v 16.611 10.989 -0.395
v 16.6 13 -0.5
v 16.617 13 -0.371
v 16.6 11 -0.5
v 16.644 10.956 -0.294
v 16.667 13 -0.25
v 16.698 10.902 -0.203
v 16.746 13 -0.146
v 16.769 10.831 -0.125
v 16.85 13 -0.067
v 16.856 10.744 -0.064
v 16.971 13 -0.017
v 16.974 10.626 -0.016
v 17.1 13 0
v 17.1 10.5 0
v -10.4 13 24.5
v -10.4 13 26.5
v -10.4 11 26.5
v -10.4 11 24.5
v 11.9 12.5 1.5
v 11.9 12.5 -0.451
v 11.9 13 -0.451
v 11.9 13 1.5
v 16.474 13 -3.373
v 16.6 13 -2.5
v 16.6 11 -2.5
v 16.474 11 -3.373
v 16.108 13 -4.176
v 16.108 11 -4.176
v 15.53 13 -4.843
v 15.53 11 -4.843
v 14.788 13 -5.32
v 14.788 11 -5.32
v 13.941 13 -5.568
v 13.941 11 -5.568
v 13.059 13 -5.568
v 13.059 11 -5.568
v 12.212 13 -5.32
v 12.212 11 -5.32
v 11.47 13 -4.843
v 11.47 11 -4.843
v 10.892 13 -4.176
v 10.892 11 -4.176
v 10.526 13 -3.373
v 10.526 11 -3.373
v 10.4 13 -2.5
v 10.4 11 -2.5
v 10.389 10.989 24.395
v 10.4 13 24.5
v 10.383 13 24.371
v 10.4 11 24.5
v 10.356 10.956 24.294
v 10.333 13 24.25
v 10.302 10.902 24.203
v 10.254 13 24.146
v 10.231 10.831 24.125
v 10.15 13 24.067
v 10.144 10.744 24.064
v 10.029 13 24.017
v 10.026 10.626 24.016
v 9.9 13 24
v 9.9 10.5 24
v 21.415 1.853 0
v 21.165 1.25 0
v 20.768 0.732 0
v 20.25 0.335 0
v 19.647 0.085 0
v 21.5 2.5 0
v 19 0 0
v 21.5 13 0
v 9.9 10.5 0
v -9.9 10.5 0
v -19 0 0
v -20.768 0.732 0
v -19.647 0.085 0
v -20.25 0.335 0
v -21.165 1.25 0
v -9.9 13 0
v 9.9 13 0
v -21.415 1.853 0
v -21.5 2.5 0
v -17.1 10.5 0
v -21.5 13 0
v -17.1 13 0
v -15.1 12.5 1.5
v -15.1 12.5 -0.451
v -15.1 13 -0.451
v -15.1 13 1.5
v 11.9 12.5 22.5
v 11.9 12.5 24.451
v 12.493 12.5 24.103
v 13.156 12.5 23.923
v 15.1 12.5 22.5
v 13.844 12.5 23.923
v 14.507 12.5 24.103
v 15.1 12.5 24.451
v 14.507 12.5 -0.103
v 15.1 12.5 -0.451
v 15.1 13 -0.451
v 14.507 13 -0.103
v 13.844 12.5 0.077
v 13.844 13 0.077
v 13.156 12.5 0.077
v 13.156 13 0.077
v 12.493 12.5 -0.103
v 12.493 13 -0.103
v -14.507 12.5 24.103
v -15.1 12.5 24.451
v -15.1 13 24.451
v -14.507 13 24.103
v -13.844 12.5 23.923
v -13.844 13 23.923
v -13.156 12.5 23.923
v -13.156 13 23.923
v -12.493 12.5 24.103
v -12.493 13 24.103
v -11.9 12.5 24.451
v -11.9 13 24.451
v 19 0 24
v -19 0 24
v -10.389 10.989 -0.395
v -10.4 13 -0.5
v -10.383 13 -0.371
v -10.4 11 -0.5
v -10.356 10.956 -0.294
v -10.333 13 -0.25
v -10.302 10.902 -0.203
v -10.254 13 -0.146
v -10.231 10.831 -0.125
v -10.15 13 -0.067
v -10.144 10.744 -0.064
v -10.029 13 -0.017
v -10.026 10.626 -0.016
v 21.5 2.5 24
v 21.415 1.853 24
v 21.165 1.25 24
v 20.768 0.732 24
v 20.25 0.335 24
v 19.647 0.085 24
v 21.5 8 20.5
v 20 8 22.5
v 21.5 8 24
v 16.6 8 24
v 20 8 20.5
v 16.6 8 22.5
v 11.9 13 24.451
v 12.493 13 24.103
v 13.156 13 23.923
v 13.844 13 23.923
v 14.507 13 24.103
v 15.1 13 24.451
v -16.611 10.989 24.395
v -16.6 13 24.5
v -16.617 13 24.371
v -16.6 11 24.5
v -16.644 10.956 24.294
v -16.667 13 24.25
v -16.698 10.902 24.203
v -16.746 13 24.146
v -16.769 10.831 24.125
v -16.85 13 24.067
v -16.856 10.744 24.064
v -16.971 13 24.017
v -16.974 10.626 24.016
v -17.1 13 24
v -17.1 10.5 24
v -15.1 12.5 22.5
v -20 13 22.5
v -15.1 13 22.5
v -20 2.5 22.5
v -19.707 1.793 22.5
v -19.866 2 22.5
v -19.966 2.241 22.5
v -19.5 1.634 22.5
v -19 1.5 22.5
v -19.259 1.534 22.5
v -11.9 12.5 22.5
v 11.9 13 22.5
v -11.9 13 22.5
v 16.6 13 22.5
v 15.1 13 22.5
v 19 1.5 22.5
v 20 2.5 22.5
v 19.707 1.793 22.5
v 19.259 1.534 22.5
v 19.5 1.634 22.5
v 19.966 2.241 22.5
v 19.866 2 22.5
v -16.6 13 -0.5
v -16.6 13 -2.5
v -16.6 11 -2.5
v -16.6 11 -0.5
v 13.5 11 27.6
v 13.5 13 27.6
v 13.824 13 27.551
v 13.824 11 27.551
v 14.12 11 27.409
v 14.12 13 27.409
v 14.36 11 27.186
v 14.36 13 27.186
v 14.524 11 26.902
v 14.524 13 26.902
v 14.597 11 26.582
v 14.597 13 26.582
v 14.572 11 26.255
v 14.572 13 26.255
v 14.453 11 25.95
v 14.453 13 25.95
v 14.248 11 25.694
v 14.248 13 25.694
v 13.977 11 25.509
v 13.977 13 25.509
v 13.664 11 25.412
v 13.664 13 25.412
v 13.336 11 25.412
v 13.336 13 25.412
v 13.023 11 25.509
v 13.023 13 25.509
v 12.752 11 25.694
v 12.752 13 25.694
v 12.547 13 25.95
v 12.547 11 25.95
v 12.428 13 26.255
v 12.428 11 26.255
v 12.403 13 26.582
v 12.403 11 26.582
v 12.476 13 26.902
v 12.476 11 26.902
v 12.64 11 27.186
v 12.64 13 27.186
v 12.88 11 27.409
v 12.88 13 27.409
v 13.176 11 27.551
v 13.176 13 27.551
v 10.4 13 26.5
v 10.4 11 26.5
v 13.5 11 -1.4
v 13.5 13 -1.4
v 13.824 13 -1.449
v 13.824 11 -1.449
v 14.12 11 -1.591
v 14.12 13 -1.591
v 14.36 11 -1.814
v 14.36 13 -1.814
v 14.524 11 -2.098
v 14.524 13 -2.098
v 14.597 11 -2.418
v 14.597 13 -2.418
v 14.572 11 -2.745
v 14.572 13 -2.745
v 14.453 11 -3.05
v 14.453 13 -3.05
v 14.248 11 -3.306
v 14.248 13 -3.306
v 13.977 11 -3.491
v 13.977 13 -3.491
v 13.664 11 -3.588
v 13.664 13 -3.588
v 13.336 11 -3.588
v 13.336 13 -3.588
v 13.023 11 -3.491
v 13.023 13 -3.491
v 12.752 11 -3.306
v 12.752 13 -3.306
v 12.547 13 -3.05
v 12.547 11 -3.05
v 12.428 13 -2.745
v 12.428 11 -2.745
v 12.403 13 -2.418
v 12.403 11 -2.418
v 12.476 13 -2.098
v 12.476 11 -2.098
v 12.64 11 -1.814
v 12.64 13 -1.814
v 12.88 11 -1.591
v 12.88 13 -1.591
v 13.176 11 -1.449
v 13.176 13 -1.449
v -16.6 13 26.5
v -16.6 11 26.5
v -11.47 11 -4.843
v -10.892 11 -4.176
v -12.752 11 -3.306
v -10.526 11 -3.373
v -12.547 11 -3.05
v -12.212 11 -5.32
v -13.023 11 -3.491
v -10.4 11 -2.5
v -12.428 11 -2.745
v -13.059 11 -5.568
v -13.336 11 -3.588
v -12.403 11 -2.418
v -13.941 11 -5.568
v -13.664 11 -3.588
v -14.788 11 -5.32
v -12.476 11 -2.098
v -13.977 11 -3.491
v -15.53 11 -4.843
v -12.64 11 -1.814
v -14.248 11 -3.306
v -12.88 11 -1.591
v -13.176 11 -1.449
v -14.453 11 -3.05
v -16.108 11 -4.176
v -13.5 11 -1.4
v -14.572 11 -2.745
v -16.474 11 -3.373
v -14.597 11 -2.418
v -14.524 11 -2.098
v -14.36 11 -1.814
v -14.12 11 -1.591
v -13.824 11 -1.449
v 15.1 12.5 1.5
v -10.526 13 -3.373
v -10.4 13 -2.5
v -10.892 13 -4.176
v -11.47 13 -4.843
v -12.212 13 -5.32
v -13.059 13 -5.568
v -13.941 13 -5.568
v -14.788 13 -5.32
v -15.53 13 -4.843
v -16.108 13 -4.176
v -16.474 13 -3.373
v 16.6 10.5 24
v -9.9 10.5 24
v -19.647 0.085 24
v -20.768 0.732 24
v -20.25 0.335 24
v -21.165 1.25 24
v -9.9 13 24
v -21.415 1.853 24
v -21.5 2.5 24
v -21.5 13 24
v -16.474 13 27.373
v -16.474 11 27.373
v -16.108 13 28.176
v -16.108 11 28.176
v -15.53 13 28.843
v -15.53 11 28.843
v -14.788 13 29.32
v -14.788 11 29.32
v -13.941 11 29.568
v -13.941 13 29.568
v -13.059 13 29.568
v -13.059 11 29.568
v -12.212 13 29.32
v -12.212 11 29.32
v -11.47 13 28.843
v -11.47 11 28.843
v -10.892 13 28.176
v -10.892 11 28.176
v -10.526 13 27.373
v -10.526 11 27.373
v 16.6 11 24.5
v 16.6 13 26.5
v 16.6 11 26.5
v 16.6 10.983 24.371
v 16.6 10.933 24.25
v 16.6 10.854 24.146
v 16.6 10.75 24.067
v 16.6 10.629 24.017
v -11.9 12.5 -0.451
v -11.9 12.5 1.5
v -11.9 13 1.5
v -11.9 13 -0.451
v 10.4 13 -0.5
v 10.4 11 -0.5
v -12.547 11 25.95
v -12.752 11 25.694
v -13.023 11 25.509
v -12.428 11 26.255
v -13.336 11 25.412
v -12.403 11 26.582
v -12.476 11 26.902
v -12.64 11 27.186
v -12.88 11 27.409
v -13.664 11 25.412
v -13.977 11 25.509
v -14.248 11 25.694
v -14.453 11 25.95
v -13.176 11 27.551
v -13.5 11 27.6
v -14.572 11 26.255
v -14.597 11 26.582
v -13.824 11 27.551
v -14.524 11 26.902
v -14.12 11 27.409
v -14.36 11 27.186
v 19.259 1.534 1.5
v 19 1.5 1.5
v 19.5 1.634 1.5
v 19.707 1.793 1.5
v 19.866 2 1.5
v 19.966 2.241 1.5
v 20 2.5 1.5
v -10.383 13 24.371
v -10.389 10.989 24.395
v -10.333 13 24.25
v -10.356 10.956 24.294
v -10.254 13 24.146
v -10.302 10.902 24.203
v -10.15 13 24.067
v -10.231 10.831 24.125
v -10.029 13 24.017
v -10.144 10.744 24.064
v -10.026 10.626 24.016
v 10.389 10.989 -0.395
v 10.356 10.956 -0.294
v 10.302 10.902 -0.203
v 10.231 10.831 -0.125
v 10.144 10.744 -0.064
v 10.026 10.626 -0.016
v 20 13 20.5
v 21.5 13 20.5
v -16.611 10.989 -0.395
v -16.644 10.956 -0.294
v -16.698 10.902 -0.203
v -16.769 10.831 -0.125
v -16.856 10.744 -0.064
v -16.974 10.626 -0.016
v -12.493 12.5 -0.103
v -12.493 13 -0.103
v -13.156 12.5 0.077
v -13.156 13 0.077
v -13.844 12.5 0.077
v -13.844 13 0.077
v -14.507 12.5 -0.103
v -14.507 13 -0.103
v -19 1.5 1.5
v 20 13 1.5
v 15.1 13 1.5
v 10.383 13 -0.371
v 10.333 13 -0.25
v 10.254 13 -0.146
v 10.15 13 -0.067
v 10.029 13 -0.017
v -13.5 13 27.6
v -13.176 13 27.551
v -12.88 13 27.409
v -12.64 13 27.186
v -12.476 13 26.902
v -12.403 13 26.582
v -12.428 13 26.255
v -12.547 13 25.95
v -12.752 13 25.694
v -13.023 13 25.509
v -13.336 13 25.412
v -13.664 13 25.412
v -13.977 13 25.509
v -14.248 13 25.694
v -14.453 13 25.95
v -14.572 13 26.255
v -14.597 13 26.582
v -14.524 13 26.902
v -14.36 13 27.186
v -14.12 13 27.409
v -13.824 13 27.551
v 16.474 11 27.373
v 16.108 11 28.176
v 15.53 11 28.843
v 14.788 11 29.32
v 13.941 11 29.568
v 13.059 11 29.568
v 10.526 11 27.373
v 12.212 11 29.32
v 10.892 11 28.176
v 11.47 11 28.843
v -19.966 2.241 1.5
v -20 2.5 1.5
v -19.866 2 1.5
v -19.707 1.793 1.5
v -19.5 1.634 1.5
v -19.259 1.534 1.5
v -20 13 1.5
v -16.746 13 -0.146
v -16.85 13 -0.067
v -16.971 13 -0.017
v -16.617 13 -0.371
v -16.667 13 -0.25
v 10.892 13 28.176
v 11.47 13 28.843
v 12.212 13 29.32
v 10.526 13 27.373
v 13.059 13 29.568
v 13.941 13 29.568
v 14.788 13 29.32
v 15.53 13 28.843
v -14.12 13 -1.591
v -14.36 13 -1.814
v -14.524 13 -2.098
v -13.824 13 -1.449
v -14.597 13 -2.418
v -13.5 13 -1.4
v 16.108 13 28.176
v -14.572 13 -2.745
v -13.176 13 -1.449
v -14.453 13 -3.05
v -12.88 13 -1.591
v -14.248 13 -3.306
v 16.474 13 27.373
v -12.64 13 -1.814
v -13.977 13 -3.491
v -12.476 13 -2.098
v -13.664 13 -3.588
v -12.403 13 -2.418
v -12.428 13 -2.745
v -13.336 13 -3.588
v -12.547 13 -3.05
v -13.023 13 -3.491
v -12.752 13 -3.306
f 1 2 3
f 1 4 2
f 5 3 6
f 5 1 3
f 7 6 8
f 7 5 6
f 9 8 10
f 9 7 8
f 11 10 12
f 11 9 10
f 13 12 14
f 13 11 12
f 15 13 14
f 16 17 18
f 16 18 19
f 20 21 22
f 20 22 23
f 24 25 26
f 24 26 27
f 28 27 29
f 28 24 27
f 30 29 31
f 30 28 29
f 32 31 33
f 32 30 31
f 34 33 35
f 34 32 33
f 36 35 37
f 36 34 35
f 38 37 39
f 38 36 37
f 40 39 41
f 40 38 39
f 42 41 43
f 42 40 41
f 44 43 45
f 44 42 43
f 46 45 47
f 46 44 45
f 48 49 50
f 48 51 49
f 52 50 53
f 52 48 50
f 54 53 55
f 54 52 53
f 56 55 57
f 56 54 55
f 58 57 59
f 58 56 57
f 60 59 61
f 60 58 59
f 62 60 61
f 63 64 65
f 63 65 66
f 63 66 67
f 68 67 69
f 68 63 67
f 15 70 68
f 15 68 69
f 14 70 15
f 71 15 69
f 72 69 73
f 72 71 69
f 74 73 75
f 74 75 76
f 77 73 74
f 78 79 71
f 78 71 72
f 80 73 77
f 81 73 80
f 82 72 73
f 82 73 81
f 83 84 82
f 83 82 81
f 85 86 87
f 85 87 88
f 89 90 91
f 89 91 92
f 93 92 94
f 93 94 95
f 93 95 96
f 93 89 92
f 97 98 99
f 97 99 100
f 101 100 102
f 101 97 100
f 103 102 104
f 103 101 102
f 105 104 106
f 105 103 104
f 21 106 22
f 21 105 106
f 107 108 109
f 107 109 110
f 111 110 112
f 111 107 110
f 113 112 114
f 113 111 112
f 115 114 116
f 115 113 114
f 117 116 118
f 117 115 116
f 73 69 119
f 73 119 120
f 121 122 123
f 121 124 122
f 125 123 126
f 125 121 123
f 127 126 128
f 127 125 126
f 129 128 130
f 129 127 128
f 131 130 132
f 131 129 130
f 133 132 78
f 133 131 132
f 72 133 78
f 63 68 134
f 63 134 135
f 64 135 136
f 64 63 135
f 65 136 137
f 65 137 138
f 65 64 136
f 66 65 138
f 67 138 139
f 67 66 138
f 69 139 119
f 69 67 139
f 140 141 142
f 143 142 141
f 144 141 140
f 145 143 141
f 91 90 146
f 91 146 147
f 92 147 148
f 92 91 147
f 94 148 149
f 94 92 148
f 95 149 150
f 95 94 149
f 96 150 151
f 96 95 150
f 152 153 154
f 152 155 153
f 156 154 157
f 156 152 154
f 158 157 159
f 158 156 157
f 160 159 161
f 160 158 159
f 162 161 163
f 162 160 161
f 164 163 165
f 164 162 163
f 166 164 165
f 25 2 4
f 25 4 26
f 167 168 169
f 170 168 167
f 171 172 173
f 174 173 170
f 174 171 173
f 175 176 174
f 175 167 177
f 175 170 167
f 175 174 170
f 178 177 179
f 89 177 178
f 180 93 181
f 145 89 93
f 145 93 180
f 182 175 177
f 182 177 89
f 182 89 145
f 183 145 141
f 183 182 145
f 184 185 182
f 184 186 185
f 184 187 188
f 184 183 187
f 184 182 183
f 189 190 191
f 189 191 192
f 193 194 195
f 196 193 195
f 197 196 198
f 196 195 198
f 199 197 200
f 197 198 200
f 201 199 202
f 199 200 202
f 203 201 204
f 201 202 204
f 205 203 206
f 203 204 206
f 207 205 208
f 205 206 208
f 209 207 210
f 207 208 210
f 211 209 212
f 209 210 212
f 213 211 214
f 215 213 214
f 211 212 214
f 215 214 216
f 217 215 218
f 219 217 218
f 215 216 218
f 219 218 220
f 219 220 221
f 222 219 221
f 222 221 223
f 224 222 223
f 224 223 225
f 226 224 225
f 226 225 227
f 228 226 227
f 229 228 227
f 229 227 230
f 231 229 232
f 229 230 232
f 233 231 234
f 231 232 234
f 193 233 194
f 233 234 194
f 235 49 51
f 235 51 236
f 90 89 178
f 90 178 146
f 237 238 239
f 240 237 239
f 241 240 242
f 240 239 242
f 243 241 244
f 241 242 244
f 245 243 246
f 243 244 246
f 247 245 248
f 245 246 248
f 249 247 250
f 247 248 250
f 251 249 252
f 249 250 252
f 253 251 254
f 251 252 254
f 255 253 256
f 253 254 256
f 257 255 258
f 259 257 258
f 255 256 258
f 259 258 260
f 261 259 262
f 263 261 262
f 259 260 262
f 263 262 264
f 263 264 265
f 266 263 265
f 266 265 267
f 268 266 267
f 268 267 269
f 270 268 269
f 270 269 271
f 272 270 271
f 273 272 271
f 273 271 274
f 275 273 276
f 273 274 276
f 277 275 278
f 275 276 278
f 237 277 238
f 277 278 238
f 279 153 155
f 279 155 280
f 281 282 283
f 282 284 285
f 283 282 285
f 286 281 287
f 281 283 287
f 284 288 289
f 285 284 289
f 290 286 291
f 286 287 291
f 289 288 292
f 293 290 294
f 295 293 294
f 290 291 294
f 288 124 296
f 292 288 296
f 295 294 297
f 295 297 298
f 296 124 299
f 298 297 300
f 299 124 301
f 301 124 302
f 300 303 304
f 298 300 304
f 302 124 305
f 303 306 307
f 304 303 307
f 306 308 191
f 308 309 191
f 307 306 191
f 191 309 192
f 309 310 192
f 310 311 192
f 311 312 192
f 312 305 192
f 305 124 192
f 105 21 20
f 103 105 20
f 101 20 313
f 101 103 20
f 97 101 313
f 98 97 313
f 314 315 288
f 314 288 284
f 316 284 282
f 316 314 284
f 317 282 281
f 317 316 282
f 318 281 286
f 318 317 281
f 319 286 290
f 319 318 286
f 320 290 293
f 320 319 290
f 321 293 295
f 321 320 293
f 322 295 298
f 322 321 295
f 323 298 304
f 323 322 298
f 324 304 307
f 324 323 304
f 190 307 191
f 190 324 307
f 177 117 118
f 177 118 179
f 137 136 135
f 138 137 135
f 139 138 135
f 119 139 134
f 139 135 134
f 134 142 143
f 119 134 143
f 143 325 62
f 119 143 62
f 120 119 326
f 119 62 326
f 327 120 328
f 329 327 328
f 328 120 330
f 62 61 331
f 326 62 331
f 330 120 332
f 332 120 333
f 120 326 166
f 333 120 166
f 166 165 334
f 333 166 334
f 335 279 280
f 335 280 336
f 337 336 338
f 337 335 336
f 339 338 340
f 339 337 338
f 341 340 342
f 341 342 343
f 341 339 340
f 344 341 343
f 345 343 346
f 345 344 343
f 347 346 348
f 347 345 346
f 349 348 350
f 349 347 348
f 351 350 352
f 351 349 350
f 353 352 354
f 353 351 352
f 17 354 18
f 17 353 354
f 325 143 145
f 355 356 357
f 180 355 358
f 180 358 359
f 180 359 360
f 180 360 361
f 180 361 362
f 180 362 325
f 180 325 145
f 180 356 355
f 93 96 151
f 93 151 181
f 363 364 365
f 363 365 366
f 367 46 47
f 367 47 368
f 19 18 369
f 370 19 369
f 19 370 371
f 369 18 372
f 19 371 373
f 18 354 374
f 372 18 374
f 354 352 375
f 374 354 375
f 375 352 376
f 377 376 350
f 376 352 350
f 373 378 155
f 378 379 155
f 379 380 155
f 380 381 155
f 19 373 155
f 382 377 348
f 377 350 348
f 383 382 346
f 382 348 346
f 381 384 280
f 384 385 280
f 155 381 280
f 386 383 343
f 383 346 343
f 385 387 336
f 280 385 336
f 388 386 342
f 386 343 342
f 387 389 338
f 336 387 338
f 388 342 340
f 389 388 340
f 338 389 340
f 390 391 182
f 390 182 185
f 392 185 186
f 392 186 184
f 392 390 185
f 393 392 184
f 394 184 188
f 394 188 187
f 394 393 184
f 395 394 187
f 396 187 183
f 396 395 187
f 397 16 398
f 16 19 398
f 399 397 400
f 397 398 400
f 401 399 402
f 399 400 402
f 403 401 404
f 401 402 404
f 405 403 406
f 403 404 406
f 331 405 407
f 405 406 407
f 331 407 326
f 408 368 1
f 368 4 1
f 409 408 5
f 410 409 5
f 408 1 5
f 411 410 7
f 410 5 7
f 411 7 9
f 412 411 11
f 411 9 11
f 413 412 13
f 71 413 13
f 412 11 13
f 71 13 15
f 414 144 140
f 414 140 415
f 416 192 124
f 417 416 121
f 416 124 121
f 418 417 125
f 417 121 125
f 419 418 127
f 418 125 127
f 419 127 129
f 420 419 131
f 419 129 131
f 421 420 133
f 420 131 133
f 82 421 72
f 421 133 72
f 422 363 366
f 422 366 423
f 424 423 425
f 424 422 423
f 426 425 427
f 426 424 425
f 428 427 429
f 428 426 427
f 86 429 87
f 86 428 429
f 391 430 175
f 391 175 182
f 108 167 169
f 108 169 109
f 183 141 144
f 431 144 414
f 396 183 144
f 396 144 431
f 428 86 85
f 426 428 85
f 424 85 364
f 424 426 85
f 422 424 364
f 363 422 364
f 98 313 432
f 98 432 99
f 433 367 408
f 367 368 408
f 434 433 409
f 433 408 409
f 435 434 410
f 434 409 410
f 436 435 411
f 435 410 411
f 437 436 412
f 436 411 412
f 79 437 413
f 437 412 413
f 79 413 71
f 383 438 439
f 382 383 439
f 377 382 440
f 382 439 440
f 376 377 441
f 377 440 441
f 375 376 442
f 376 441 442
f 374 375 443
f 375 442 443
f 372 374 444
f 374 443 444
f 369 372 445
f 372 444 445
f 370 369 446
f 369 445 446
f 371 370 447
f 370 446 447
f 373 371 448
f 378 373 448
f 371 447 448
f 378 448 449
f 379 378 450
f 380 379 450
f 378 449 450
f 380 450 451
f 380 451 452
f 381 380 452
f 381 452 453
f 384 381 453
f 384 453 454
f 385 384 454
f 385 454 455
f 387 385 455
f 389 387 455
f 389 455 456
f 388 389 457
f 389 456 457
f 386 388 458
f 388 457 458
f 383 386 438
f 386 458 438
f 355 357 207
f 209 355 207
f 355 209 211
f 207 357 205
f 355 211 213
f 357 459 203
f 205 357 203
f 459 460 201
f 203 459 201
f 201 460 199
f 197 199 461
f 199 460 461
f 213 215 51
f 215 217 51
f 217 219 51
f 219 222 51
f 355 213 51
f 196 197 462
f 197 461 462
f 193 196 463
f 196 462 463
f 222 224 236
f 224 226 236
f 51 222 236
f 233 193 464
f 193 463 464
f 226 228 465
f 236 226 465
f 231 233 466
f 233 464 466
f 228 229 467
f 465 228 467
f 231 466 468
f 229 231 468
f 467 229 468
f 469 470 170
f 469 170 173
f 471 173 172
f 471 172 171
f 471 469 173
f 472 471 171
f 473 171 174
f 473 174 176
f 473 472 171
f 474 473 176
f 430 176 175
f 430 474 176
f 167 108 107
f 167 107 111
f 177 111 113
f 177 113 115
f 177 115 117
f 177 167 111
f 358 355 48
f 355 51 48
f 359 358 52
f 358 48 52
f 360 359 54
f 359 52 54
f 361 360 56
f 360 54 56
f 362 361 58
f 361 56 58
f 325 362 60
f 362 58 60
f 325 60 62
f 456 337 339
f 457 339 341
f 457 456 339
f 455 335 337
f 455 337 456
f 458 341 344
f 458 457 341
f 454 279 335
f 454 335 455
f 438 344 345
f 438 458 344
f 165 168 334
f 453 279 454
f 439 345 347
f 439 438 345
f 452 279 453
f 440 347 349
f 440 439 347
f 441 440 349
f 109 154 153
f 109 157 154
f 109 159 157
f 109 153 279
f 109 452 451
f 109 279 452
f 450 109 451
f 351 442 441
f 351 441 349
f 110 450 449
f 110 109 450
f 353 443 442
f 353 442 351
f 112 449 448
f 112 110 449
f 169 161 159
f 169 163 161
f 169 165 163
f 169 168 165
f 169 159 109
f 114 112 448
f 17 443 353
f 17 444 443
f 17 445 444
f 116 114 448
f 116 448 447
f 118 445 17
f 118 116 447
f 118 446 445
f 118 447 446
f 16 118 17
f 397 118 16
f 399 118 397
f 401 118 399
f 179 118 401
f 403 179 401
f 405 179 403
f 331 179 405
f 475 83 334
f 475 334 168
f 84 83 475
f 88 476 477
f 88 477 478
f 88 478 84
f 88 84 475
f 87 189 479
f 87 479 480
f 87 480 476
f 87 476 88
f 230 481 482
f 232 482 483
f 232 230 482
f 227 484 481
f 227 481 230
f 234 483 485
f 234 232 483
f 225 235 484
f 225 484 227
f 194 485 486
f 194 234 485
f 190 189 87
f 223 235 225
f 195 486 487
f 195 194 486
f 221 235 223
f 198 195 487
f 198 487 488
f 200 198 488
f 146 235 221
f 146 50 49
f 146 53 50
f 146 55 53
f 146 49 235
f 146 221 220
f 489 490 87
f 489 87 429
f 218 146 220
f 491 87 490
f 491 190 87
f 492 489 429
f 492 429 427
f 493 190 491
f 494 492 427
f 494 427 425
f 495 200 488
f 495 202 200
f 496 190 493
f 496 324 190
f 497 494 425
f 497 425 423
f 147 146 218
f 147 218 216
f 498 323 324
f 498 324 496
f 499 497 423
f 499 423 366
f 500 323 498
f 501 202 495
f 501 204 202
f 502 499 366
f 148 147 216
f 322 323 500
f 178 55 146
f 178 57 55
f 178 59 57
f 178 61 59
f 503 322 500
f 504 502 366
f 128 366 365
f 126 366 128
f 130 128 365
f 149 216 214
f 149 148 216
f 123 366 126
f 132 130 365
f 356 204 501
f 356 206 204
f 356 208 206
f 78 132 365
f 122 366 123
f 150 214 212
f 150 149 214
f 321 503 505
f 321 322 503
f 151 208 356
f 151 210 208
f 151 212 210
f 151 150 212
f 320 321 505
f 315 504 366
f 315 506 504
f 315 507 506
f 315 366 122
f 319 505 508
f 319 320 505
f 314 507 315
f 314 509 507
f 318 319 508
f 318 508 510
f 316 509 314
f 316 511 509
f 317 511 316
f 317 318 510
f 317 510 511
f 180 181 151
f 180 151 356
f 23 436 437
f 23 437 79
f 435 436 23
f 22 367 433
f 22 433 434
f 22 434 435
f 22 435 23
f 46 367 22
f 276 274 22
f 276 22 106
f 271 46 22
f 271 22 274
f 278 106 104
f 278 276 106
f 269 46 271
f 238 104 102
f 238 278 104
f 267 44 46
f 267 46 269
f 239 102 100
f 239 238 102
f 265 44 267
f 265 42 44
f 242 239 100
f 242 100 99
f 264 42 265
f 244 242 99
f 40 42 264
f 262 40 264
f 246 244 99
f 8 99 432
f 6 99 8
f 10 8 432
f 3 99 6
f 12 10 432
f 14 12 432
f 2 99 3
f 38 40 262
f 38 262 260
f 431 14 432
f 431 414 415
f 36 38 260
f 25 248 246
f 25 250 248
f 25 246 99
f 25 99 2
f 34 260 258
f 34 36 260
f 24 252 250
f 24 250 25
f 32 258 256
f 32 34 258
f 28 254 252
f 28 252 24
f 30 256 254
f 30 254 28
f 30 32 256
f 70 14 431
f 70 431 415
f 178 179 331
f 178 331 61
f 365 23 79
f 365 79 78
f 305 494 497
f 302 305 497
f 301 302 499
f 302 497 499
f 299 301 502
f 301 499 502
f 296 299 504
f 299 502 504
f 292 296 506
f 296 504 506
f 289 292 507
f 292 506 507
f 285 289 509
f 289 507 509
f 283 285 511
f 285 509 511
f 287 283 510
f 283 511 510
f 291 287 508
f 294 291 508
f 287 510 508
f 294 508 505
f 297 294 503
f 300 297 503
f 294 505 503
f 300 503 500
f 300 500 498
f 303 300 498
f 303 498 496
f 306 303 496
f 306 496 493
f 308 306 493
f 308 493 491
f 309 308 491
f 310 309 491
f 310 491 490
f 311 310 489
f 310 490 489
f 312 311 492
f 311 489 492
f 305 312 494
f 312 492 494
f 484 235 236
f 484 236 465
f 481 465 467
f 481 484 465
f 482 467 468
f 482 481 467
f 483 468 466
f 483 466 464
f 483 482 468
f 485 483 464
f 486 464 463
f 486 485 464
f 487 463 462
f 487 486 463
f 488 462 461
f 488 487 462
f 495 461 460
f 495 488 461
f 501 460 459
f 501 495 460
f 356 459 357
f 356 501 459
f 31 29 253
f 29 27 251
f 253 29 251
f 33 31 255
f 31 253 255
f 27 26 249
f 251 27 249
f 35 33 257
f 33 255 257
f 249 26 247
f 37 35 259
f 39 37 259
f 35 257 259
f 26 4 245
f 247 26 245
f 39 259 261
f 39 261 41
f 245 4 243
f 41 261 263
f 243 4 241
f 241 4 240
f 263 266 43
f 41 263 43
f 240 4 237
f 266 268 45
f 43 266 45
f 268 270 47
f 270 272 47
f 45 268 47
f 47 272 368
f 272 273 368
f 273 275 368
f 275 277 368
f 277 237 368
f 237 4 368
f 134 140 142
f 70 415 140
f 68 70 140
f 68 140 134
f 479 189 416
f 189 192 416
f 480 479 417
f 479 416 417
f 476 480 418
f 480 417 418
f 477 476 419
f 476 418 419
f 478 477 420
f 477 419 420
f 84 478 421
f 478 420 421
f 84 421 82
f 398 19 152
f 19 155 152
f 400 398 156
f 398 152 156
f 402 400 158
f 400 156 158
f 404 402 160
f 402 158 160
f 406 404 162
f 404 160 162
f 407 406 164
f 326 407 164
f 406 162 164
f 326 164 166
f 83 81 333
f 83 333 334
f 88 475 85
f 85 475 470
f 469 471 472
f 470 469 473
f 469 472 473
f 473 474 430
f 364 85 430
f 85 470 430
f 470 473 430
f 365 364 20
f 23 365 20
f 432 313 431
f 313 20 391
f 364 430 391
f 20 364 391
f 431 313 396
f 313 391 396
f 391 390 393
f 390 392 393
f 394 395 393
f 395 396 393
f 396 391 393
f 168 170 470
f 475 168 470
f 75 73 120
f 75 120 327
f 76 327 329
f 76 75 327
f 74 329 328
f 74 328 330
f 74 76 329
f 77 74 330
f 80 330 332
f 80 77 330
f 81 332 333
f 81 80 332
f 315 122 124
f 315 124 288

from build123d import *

# Parameters (mm, degrees)
BOSS_EXTRUDE1_DEPTH = 24
SKETCH3_R           = 1.1
BOSS_EXTRUDE6_DEPTH = 2
SHELL1_START        = 2.5
SHELL1_OUTLINE_W    = 40
SHELL1_OUTLINE_H    = 21
SHELL1_DEPTH        = 10.5
SHELL1_START_2      = 12.5
SHELL1_2_DEPTH      = 0.5
SHELL1_START_3      = 1.5
SHELL1_3_DEPTH      = 21
CUT_EXTRUDE1_START  = 16.6
SKETCH5_W           = 3.5
SKETCH5_H           = 5
CUT_EXTRUDE1_DEPTH  = 4.9
FILLET1_R           = 0.5


with BuildPart() as part:
    # Sketch1 → Boss-Extrude1 (new body)
    with BuildSketch(Plane.XY):
        with BuildLine():
            Line((-21.5, 13), (21.5, 13))
            Line((21.5, 13), (21.5, 2.5))
            ThreePointArc((21.5, 2.5), (20.767766953, 0.732233047), (19, 0))
            Line((19, 0), (-19, 0))
            ThreePointArc((-19, 0), (-20.767766953, 0.732233047), (-21.5, 2.5))
            Line((-21.5, 2.5), (-21.5, 13))
        make_face()
    extrude(amount=BOSS_EXTRUDE1_DEPTH)

    # Sketch3 → Boss-Extrude6 (add)
    # profile 1 of 4: a face of its own
    with BuildSketch(Plane(origin=(0, 13, 0), x_dir=(-1, 0, 0), z_dir=(0, 1, 0))):
        with BuildLine():
            Line((16.6, 0), (10.4, 0))
            Line((10.4, 0), (10.4, -2.5))
            ThreePointArc((10.4, -2.5), (13.5, -5.6), (16.6, -2.5))
            Line((16.6, -2.5), (16.6, 0))
        make_face()
        with Locations(Location((13.5, -2.5, 0), (0, 0, 90))):
            Circle(SKETCH3_R, mode=Mode.SUBTRACT)
    # profile 2 of 4: a face of its own
    with BuildSketch(Plane(origin=(0, 13, 0), x_dir=(-1, 0, 0), z_dir=(0, 1, 0))):
        with BuildLine():
            Line((-10.4, 0), (-16.6, 0))
            Line((-16.6, 0), (-16.6, -2.5))
            ThreePointArc((-16.6, -2.5), (-13.5, -5.6), (-10.4, -2.5))
            Line((-10.4, -2.5), (-10.4, 0))
        make_face()
        with Locations(Location((-13.5, -2.5, 0), (0, 0, 90))):
            Circle(SKETCH3_R, mode=Mode.SUBTRACT)
    # profile 3 of 4: a face of its own
    with BuildSketch(Plane(origin=(0, 13, 0), x_dir=(-1, 0, 0), z_dir=(0, 1, 0))):
        with BuildLine():
            Line((-16.6, 26.5), (-16.6, 24))
            Line((-16.6, 24), (-10.4, 24))
            Line((-10.4, 24), (-10.4, 26.5))
            ThreePointArc((-10.4, 26.5), (-13.5, 29.6), (-16.6, 26.5))
        make_face()
        with Locations(Location((-13.5, 26.5, 0), (0, 0, 90))):
            Circle(SKETCH3_R, mode=Mode.SUBTRACT)
    # profile 4 of 4: a face of its own
    with BuildSketch(Plane(origin=(0, 13, 0), x_dir=(-1, 0, 0), z_dir=(0, 1, 0))):
        with BuildLine():
            Line((10.4, 26.5), (10.4, 24))
            Line((10.4, 24), (16.6, 24))
            Line((16.6, 24), (16.6, 26.5))
            ThreePointArc((16.6, 26.5), (13.5, 29.6), (10.4, 26.5))
        make_face()
        with Locations(Location((13.5, 26.5, 0), (0, 0, 90))):
            Circle(SKETCH3_R, mode=Mode.SUBTRACT)
    extrude(amount=-BOSS_EXTRUDE6_DEPTH)

    # Shell1: read off the stored shape, not the designer's step
    # Shell1 outline → Shell1 (cut)
    with BuildSketch(Plane(origin=(0, 0, 0), x_dir=(1, 0, 0), z_dir=(0, 1, 0)).offset(SHELL1_START)):
        with Locations((0, -12)):
            Rectangle(SHELL1_OUTLINE_W, SHELL1_OUTLINE_H)
    extrude(amount=SHELL1_DEPTH, mode=Mode.SUBTRACT)

    # Shell1 2 outline → Shell1 2 (cut)
    with BuildSketch(Plane(origin=(0, 0, 0), x_dir=(1, 0, 0), z_dir=(0, 1, 0)).offset(SHELL1_START_2)):
        with BuildLine():
            Line((-15.1, 0.450609847), (-15.1, -1.5))
            Line((-15.1, -1.5), (-11.9, -1.5))
            Line((-11.9, -1.5), (-11.9, 0.450609847))
            ThreePointArc((-11.9, 0.450609847), (-13.5, -0.1), (-15.1, 0.450609847))
        make_face()
        with BuildLine():
            Line((-11.9, -22.5), (-15.1, -22.5))
            Line((-15.1, -22.5), (-15.1, -24.450609847))
            ThreePointArc((-15.1, -24.450609847), (-13.5, -23.9), (-11.9, -24.450609847))
            Line((-11.9, -24.450609847), (-11.9, -22.5))
        make_face()
        with BuildLine():
            Line((11.9, 0.450609847), (11.9, -1.5))
            Line((11.9, -1.5), (15.1, -1.5))
            Line((15.1, -1.5), (15.1, 0.450609847))
            ThreePointArc((15.1, 0.450609847), (13.5, -0.1), (11.9, 0.450609847))
        make_face()
        with BuildLine():
            Line((15.1, -22.5), (11.9, -22.5))
            Line((11.9, -22.5), (11.9, -24.450609847))
            ThreePointArc((11.9, -24.450609847), (13.5, -23.9), (15.1, -24.450609847))
            Line((15.1, -24.450609847), (15.1, -22.5))
        make_face()
    extrude(amount=SHELL1_2_DEPTH, mode=Mode.SUBTRACT)

    # Shell1 3 outline → Shell1 3 (cut)
    with BuildSketch(Plane.XY.offset(SHELL1_START_3)):
        with BuildLine():
            ThreePointArc((19, 1.5), (19.707106781, 1.792893219), (20, 2.5))
            Line((20, 2.5), (-20, 2.5))
            ThreePointArc((-20, 2.5), (-19.707106781, 1.792893219), (-19, 1.5))
            Line((-19, 1.5), (19, 1.5))
        make_face()
    extrude(amount=SHELL1_3_DEPTH, mode=Mode.SUBTRACT)

    # Sketch5 → Cut-Extrude1 (cut)
    with BuildSketch(Plane(origin=(0, 0, 0), x_dir=(0, 0, -1), z_dir=(1, 0, 0)).offset(CUT_EXTRUDE1_START)):
        with Locations((-22.25, 10.5)):
            Rectangle(SKETCH5_W, SKETCH5_H)
    extrude(amount=CUT_EXTRUDE1_DEPTH, mode=Mode.SUBTRACT)

    # Fillet1
    fillet1_edges = [part.edges().sort_by_distance(p)[0] for p in [
        (-10.4, 12, 24),
        (-16.6, 12, 24),
        (10.4, 12, 24),
        (10.4, 12, 0),
        (16.6, 12, 0),
        (-10.4, 12, 0),
        (-16.6, 12, 0),
        (13.5, 11, 0),
        (-13.5, 11, 0),
        (13.5, 11, 24),
        (-13.5, 11, 24),
    ]]
    fillet(fillet1_edges, radius=FILLET1_R)


solid = part.part
